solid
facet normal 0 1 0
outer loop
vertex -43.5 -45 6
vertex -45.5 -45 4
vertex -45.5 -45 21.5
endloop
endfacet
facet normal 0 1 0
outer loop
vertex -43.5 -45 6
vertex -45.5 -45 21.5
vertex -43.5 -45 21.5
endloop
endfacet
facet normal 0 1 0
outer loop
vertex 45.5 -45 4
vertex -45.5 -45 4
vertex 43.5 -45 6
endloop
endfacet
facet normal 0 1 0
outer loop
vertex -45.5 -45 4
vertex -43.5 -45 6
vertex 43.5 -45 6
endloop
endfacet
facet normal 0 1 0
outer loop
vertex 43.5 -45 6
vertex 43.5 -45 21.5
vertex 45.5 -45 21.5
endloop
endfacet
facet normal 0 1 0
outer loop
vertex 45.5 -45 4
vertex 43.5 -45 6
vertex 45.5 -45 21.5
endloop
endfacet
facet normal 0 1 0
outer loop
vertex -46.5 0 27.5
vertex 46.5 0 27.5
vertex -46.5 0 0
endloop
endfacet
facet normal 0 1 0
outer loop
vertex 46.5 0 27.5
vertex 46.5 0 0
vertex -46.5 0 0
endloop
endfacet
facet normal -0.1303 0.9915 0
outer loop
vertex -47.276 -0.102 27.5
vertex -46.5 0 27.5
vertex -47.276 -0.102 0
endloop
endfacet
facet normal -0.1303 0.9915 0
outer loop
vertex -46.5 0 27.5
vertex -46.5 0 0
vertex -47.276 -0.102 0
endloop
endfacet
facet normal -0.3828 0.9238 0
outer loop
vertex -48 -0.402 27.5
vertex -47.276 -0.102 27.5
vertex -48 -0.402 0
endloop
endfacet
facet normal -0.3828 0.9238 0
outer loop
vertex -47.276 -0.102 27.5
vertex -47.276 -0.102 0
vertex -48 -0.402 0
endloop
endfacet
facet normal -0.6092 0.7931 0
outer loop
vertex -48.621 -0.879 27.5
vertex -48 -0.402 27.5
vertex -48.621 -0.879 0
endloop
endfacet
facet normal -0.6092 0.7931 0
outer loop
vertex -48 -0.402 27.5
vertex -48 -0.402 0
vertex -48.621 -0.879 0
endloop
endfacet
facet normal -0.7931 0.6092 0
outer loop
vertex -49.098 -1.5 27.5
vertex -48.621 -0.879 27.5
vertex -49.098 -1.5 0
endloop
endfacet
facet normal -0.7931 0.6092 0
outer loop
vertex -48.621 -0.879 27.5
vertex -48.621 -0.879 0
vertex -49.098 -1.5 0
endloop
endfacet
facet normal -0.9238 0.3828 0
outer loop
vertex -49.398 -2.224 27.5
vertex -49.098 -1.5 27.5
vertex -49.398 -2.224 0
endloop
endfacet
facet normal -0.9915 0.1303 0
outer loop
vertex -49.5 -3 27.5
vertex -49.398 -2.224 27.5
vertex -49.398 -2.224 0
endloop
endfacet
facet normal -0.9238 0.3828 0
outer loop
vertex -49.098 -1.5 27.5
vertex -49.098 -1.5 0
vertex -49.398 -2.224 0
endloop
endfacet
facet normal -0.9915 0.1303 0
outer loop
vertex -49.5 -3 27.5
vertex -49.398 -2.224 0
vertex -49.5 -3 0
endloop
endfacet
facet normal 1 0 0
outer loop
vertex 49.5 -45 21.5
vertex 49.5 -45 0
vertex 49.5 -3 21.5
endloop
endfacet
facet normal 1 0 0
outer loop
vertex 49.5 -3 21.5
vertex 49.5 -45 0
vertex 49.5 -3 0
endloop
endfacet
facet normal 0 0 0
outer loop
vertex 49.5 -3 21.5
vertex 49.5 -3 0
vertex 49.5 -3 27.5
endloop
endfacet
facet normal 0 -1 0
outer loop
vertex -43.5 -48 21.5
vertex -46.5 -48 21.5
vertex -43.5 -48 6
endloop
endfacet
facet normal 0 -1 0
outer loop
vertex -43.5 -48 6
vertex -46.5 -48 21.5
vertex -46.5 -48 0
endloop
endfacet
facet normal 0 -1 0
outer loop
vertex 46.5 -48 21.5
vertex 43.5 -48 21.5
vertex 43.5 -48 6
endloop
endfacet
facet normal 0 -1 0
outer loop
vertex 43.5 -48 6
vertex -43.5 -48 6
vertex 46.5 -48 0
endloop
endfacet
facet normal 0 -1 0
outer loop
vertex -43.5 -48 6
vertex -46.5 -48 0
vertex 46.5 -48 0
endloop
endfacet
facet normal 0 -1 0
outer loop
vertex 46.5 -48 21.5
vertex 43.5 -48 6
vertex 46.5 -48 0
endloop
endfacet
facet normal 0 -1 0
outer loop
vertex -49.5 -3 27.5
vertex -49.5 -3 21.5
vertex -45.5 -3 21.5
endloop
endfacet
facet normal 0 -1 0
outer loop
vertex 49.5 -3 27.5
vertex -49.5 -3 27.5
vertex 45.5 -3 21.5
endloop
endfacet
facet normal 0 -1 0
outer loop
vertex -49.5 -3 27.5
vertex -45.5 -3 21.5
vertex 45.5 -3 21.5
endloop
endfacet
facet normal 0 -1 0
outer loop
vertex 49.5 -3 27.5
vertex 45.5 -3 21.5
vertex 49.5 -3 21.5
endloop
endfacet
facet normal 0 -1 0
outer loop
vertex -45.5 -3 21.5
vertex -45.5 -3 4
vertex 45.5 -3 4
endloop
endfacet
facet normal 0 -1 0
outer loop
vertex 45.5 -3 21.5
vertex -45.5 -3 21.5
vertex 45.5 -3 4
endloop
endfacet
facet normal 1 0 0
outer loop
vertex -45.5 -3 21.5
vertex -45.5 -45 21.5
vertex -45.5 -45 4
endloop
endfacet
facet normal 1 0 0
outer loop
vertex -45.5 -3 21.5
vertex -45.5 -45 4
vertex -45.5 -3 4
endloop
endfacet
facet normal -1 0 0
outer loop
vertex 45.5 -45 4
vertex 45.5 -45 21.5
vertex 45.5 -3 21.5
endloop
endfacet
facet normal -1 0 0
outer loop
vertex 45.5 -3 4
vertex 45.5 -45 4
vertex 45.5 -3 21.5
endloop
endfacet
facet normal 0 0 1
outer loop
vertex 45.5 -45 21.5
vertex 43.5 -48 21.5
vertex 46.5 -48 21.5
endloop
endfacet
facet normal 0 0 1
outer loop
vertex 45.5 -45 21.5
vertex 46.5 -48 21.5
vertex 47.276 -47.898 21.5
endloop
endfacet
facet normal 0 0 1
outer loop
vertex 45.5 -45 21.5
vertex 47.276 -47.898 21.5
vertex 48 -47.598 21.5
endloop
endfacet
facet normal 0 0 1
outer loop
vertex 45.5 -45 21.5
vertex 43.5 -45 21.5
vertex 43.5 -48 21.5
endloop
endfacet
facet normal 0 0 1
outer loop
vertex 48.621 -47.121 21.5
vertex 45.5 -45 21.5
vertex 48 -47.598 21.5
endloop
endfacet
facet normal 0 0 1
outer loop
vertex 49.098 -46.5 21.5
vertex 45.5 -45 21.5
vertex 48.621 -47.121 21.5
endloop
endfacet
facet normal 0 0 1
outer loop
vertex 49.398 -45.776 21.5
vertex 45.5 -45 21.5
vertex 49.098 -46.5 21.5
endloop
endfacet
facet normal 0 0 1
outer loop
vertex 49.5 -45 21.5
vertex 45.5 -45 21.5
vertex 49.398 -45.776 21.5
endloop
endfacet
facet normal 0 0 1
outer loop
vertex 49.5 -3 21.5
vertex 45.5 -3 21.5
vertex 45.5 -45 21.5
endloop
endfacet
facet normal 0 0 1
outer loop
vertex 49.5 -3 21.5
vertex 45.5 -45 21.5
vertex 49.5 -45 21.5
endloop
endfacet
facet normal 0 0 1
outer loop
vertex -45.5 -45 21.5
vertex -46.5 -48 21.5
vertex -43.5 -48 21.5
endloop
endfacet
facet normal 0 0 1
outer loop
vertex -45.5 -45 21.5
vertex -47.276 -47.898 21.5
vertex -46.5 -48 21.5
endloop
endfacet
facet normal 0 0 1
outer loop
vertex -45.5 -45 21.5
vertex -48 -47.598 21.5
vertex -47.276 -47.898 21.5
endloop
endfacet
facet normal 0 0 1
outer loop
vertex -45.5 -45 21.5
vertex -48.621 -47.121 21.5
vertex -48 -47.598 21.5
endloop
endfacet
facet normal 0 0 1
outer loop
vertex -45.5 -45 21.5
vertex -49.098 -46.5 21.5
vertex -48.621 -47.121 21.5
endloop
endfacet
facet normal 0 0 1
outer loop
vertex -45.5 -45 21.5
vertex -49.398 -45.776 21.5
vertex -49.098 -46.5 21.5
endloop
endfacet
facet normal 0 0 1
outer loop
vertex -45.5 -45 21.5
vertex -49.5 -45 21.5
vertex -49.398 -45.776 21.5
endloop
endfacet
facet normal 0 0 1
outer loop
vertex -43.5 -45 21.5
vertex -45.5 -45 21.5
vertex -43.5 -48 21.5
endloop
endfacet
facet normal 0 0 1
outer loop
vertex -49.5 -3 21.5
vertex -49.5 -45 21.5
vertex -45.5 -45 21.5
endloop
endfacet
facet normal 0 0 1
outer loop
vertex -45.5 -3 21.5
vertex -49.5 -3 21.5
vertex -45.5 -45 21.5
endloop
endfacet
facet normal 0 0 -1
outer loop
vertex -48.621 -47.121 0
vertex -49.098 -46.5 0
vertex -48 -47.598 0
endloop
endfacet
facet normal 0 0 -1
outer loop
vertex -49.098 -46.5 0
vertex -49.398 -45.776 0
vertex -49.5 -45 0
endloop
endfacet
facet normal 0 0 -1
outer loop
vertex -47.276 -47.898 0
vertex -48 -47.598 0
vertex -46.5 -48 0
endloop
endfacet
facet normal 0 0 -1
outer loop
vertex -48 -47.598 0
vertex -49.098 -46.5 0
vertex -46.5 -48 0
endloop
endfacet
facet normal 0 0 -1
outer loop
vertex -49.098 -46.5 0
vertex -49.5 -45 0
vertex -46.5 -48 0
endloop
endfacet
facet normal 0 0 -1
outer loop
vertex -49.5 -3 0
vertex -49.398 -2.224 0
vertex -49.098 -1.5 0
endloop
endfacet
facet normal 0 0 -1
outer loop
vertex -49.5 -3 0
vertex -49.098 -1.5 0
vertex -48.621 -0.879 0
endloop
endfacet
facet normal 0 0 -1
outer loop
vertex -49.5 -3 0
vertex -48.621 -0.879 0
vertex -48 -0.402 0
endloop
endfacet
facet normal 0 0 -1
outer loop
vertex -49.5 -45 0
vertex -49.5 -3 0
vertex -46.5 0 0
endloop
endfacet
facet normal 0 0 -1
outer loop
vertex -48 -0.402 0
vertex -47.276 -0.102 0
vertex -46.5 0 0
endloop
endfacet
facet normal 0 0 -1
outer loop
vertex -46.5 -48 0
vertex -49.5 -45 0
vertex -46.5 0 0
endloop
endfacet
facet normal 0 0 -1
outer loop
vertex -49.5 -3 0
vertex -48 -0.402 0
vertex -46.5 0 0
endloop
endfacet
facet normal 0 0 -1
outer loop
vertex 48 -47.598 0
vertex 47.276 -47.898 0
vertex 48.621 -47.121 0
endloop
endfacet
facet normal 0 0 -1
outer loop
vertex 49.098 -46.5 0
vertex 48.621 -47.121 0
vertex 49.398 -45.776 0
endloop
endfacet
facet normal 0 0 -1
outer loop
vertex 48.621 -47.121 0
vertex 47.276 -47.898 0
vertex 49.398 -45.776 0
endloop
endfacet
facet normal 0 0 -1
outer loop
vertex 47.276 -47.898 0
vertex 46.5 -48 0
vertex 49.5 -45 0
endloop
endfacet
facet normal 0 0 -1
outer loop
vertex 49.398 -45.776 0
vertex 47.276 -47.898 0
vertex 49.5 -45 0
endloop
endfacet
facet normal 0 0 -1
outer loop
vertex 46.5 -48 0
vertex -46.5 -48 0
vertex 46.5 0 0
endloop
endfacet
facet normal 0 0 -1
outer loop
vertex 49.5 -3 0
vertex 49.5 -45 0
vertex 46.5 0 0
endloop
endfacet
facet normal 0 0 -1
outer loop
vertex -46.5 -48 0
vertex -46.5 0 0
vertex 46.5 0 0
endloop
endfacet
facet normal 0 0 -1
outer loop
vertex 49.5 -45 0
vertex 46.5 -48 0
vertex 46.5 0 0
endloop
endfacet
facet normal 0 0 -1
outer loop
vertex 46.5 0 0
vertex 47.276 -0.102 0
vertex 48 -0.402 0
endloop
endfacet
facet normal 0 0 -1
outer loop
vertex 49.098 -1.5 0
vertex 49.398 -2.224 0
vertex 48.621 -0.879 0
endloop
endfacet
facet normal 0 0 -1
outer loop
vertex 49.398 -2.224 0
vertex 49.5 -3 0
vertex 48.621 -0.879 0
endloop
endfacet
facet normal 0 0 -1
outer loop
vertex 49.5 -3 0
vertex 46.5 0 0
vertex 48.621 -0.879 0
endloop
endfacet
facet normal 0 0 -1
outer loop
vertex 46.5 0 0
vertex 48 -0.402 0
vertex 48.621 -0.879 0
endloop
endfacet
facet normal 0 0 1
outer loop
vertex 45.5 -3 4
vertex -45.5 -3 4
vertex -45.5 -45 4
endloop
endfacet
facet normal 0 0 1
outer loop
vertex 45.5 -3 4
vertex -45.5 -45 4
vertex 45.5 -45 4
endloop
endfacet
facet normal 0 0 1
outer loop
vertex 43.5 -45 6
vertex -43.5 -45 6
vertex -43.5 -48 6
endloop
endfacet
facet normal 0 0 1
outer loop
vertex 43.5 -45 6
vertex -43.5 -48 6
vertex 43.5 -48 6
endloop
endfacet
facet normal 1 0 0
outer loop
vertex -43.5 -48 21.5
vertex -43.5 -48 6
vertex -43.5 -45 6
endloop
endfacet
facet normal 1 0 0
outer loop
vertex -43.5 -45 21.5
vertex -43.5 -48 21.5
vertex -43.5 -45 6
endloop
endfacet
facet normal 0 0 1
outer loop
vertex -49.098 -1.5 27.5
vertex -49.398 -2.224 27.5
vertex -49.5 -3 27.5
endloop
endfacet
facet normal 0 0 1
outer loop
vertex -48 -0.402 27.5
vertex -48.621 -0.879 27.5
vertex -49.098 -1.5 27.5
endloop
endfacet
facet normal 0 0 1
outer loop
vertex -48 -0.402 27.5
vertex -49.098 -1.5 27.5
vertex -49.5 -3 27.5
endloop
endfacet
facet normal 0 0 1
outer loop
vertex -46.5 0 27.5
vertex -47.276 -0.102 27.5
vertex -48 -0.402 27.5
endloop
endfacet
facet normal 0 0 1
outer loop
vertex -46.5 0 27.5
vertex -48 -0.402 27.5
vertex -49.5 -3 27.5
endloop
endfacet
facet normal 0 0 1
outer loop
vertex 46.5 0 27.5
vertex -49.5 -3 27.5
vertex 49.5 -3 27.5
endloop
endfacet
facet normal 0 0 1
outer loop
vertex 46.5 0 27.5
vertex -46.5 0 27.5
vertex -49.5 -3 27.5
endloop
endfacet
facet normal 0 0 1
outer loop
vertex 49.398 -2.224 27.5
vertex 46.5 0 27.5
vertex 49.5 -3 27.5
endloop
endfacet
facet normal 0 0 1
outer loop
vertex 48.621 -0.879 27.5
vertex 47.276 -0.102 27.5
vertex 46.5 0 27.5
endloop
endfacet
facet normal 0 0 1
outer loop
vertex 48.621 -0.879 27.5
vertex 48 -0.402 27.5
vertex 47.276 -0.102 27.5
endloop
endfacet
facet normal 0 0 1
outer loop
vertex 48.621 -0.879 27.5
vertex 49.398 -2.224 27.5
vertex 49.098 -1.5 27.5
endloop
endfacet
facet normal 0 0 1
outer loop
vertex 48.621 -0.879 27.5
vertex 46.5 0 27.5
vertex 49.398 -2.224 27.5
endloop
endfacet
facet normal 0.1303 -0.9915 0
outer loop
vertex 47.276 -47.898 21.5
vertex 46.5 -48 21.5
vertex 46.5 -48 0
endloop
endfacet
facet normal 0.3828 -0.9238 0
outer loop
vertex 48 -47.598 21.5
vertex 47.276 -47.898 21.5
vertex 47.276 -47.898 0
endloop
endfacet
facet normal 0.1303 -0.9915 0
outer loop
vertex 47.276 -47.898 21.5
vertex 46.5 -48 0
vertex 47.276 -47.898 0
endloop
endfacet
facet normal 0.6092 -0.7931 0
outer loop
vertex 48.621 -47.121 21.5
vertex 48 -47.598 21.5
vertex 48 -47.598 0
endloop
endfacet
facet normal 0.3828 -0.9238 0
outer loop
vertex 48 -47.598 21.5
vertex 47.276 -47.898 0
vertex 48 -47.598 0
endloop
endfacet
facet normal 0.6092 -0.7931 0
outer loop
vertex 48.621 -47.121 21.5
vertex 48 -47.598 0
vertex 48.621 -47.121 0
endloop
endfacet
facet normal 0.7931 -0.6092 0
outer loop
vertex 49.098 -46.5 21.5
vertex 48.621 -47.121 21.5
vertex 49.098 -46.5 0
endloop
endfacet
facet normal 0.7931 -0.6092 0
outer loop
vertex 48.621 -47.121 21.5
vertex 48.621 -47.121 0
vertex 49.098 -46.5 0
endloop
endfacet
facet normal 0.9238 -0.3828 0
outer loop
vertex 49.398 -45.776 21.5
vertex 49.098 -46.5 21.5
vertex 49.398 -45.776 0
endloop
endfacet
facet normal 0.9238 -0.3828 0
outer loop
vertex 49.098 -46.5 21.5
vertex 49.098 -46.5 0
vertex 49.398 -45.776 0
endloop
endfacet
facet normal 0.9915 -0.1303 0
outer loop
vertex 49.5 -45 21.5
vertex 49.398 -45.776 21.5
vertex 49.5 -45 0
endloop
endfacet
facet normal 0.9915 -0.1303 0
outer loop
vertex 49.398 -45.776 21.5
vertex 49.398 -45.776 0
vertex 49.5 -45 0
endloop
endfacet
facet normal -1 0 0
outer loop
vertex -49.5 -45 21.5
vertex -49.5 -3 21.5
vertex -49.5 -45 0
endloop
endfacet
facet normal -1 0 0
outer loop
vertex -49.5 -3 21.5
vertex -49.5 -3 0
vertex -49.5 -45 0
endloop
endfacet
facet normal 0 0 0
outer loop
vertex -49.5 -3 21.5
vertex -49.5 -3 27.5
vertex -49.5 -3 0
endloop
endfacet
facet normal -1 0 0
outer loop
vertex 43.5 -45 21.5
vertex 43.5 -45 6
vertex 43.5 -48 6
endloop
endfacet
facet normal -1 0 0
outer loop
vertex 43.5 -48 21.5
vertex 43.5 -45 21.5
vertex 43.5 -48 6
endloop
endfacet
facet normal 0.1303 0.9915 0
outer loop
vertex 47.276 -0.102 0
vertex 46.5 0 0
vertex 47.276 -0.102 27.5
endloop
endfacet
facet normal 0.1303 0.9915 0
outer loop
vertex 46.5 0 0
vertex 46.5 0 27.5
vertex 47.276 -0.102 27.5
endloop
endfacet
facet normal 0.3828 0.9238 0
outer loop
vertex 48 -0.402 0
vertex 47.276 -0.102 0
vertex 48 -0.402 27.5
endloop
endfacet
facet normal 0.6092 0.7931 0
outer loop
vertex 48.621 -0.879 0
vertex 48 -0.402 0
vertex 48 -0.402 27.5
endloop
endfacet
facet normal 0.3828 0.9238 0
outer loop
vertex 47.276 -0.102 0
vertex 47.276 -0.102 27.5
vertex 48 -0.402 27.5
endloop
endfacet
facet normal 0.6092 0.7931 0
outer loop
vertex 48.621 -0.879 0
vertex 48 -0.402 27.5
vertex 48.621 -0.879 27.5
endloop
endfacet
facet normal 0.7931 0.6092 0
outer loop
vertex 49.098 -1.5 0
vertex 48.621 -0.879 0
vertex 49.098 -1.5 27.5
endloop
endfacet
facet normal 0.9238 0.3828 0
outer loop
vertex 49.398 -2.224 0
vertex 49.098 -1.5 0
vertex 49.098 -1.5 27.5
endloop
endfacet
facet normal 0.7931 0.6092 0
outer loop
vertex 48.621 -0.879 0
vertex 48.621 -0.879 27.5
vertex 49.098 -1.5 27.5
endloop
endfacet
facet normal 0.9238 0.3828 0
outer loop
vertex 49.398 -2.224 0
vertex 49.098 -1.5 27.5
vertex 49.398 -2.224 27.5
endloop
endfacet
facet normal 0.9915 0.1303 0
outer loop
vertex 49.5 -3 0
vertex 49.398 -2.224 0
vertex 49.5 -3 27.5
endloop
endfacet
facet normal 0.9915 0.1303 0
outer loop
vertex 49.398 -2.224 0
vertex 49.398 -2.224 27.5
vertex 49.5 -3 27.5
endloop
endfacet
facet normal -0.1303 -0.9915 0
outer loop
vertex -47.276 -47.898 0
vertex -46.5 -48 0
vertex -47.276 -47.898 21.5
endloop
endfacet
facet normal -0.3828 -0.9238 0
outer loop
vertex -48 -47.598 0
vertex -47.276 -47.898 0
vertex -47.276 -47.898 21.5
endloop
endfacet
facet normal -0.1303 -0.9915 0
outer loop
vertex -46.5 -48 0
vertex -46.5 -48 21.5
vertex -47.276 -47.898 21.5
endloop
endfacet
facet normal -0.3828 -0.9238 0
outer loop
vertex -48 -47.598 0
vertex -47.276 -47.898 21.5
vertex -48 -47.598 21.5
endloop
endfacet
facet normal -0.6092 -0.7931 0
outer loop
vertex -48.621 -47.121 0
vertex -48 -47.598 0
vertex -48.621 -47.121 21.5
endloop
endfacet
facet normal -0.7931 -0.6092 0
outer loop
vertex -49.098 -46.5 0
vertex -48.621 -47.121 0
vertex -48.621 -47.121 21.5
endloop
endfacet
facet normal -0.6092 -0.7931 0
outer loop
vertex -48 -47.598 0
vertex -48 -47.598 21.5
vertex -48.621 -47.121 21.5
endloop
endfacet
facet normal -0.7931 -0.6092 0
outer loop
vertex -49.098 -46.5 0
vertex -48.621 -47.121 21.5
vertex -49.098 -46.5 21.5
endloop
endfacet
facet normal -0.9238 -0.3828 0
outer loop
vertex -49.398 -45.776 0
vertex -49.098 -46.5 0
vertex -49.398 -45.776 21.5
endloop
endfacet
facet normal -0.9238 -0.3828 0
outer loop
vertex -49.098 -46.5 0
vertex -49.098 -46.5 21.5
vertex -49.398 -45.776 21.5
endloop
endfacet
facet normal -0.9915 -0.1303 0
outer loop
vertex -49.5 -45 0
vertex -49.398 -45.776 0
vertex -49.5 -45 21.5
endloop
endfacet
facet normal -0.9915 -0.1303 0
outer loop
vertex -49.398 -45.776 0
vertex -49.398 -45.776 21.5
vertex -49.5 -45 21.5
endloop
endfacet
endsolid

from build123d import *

# Parameters (mm, degrees)
F0_W     = 99
F0_H     = 6
F1_DEPTH = 48
F3_DEPTH = 15.5
F4_W     = 2
F4_H     = 42
F4_W_2   = 87
F5_DEPTH = 17.5
F6_DEPTH = 6
F7_R     = 2.99999


# Not quite as in the source:
# - a fillet or chamfer is up to 0.001 mm smaller than in the source, because OpenCascade refuses the exact size


with BuildPart() as f1:
    # F0 (on Front) → F1 (new body)
    with BuildSketch(Plane.XZ):
        with Locations((0, 3)):
            Rectangle(F0_W, F0_H)
    extrude(amount=F1_DEPTH)

    # F2 (on face) → F3 (join)
    with BuildSketch(Plane.XY.offset(6)):
        Polygon((49.5, -3), (49.5, 0), (43.5, 0), (-43.5, 0), (-49.5, 0), (-49.5, -3), (-49.5, -48), (-43.5, -48), (-43.5, -3), (43.5, -3), (43.5, -48), (49.5, -48), align=None)
    extrude(amount=F3_DEPTH)

    # F4 (on face) → F5 (cut)
    with BuildSketch(Plane.XY.offset(21.5)):
        with Locations((-44.5, -24)):
            Rectangle(F4_W, F4_H)
        with Locations((0, -24)):
            Rectangle(F4_W_2, F4_H)
        with Locations((44.5, -24)):
            Rectangle(F4_W, F4_H)
    extrude(amount=-F5_DEPTH, mode=Mode.SUBTRACT)

    # F4 (on face) → F6 (join)
    with BuildSketch(Plane.XY.offset(21.5)):
        Polygon((-49.5, -3), (-45.5, -3), (-43.5, -3), (43.5, -3), (45.5, -3), (49.5, -3), (49.5, 0), (-49.5, 0), align=None)
    extrude(amount=F6_DEPTH)

    # F7 (radius 3 in the source; OpenCascade refuses exactly that, so slightly less here)
    f7_edges = [f1.edges().sort_by_distance(p)[0] for p in [
        (-49.5, -48, 10.75),
        (49.5, -48, 10.75),
        (49.5, 0, 13.75),
        (-49.5, 0, 13.75),
    ]]
    fillet(f7_edges, radius=F7_R)


solid = f1.part
